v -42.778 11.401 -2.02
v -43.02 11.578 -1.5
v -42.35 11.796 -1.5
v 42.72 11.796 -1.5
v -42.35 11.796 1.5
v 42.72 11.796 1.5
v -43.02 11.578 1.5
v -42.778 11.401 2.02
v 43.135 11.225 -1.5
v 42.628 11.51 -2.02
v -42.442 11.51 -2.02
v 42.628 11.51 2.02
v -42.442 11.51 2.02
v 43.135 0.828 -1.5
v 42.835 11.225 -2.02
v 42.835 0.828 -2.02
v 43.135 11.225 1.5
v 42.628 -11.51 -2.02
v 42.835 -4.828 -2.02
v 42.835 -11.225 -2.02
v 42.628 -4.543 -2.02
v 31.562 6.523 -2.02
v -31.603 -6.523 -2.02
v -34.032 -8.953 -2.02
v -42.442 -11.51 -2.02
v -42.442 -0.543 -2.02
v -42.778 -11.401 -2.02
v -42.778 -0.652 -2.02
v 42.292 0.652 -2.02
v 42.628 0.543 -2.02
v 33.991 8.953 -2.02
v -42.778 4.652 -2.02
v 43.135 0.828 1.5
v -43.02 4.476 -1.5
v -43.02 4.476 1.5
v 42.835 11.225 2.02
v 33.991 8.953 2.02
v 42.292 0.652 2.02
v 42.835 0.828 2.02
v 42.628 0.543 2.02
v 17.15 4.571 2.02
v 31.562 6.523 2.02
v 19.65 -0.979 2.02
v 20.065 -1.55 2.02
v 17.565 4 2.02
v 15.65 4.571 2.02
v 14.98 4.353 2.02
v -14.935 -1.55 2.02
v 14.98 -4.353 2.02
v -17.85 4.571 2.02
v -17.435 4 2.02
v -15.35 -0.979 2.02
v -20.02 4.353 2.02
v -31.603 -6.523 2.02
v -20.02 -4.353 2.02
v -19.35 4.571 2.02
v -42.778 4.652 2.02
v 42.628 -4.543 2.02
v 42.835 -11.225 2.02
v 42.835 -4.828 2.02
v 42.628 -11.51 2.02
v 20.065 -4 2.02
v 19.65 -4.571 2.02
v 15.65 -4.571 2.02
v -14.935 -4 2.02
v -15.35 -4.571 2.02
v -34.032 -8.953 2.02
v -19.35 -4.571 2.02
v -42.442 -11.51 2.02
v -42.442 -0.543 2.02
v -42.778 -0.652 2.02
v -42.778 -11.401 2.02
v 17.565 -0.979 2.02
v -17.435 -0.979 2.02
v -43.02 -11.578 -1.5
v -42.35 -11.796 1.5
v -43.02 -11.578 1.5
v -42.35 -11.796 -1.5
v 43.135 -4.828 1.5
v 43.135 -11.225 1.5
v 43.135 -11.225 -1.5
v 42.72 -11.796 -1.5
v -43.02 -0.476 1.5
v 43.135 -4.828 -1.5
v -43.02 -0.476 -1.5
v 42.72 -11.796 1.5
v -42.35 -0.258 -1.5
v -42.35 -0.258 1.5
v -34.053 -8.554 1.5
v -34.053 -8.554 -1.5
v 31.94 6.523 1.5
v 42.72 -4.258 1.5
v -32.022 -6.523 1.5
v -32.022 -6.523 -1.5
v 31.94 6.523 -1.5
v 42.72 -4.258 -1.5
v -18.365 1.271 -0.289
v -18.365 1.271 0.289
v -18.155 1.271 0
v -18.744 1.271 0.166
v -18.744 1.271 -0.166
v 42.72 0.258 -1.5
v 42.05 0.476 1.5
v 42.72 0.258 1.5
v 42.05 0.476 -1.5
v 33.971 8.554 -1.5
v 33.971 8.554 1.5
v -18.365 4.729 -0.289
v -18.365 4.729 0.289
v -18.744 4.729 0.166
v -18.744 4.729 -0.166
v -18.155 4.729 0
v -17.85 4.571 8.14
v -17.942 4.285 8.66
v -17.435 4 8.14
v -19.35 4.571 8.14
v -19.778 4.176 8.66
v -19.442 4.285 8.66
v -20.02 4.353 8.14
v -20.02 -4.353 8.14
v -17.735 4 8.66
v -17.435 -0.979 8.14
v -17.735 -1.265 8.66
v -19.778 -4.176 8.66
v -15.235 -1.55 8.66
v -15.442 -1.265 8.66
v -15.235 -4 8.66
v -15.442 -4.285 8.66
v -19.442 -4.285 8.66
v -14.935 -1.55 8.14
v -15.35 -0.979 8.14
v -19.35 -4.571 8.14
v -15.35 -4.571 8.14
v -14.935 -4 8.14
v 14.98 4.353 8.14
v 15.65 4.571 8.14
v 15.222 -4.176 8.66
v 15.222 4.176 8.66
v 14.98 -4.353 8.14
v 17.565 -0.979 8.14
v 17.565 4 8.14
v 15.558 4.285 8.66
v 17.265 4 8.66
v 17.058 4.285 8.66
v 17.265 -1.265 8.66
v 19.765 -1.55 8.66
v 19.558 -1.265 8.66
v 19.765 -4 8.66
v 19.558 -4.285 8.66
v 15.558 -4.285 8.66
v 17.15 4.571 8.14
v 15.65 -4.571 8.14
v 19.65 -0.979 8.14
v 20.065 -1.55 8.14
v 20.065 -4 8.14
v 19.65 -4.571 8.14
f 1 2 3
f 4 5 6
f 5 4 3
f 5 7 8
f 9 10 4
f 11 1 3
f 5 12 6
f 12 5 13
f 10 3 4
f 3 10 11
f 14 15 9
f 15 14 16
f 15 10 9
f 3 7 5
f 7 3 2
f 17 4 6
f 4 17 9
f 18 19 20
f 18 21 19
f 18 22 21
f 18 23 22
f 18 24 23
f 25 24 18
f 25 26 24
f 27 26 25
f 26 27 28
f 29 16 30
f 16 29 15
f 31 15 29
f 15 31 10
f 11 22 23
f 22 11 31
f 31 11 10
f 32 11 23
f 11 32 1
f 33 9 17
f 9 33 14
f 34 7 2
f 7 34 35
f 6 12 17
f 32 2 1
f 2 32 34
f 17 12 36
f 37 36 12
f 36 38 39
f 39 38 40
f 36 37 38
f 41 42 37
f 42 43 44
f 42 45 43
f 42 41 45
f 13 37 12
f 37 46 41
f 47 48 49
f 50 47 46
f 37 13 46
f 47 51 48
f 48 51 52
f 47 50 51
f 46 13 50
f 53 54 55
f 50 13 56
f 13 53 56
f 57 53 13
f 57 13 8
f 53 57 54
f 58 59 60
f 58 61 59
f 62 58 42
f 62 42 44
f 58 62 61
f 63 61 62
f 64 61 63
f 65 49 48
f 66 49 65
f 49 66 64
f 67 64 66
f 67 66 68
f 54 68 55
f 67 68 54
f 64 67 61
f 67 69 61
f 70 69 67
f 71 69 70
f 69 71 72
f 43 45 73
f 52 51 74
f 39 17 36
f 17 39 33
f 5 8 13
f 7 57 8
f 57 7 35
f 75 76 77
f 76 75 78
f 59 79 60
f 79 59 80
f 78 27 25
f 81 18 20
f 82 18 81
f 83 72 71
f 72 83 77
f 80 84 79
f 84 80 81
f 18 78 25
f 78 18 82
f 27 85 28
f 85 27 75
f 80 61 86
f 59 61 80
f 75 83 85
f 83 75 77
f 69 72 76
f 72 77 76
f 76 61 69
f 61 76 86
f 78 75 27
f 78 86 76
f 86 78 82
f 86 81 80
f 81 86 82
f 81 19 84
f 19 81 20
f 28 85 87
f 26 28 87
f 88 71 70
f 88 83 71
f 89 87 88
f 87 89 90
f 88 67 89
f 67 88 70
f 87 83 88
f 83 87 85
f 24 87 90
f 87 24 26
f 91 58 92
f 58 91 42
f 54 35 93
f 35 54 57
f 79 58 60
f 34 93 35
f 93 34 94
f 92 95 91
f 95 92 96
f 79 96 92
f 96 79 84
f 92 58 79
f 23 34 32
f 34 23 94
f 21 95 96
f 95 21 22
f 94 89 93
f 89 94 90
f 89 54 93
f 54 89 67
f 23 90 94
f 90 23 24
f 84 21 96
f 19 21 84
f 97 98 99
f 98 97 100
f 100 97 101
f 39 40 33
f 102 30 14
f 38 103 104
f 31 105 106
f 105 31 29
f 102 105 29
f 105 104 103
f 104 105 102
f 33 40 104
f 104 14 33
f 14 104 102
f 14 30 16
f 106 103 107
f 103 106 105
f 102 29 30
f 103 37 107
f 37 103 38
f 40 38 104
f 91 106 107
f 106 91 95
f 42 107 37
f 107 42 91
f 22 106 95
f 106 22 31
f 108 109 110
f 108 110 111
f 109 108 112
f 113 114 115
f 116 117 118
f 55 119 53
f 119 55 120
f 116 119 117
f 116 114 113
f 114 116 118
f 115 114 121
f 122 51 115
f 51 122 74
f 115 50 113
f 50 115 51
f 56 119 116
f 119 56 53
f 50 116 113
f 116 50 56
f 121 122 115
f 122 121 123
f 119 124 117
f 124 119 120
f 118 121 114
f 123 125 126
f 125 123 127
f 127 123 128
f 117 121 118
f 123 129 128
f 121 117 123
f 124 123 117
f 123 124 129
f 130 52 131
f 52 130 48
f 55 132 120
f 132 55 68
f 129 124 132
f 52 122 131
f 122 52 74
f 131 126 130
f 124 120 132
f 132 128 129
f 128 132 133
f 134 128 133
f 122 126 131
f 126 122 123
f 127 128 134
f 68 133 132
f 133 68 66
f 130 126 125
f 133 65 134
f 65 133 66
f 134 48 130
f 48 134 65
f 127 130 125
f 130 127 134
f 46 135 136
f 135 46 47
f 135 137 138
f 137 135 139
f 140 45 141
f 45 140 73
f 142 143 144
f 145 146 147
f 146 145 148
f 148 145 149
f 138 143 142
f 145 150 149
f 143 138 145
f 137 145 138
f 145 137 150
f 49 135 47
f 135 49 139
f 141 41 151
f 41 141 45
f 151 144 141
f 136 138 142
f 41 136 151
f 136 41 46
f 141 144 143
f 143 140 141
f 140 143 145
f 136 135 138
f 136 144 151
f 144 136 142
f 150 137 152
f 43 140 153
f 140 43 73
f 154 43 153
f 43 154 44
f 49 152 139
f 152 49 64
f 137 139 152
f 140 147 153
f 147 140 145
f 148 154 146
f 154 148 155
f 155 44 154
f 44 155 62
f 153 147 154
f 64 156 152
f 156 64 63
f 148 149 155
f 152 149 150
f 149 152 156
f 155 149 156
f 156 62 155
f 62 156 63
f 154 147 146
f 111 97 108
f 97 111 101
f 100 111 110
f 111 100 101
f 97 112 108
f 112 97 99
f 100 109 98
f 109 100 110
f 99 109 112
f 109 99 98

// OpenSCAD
// Parameters
bbox_L = 85.07; //[42.535:170.14:0.01]
bbox_W = 22.45; //[11.225:44.9:0.01]
bbox_H = 10.44; //[5.22:20.88:0.01]
plate_L = 85.07; //[42.535:170.14:0.01]
plate_W = 22.45; //[11.225:44.9:0.01]
plate_T = 3.0; //[1.5:6.0:0.1]
end_chamfer_L = 4.0; //[2.0:8.0:0.1]
prong_W = 8.0; //[4.0:16.0:0.1]
prong_T = 4.0; //[2.0:8.0:0.1]
prong_H = 7.44; //[3.72:14.88:0.01]
prong1_center_from_left = 25.0; //[12.5:50.0:0.1]
prong2_center_from_left = 60.0; //[30.0:120.0:0.1]
prong_end_step_L = 2.5; //[1.25:5.0:0.1]
prong_end_step_drop = 1.5; //[0.75:3.0:0.1]
overlap = 0.8; //[0.5:2.0:0.1]
relief_r = 1.0; //[0.5:2.0:0.1]
cosmetic_r = 0.6; //[0.3:1.2:0.1]

// Base shapes
module base_bar_plate() {
  cube([plate_L, plate_W, plate_T], center=true);
}

module end_chamfer_left() {
  translate([-plate_L/2 + end_chamfer_L/2, 0, 0])
    rotate([0, 0, 45])
    cube([end_chamfer_L, plate_W, plate_T + 2*overlap], center=true);
}

module end_chamfer_right() {
  translate([plate_L/2 - end_chamfer_L/2, 0, 0])
    rotate([0, 0, 45])
    cube([end_chamfer_L, plate_W, plate_T + 2*overlap], center=true);
}

module prong_1() {
  translate([-plate_L/2 + prong1_center_from_left, 0, plate_T/2 + prong_H/2 - overlap])
    cube([prong_T, prong_W, prong_H], center=true);
}

module prong_2() {
  translate([-plate_L/2 + prong2_center_from_left, 0, plate_T/2 + prong_H/2 - overlap])
    cube([prong_T, prong_W, prong_H], center=true);
}

module prong_1_end_shoulder_step() {
  translate([-plate_L/2 + prong1_center_from_left + prong_T/2 - prong_end_step_L/2, prong_W/2 - prong_end_step_drop/2, plate_T/2 + prong_H/2 - overlap])
    cube([prong_end_step_L, prong_W + 2*overlap, prong_H + 2*overlap], center=true);
}

module prong_2_end_shoulder_step() {
  translate([-plate_L/2 + prong2_center_from_left + prong_T/2 - prong_end_step_L/2, prong_W/2 - prong_end_step_drop/2, plate_T/2 + prong_H/2 - overlap])
    cube([prong_end_step_L, prong_W + 2*overlap, prong_H + 2*overlap], center=true);
}

module minor_relief_cuts() {
  translate([-plate_L/2 + prong1_center_from_left - prong_T/2 + relief_r, prong_W/2 - relief_r, 0])
    rotate([90, 0, 0])
    cylinder(r=relief_r, h=plate_T + 2*overlap, center=true);
}

module edge_fillets() {
  sphere(r=cosmetic_r, center=true);
}

// Operations
module plate_chamfered() {
  difference() {
    base_bar_plate();
    end_chamfer_left();
    end_chamfer_right();
  }
}

module prongs_union_raw() {
  union() {
    prong_1();
    prong_2();
  }
}

module prongs_stepped_1() {
  difference() {
    prongs_union_raw();
    prong_1_end_shoulder_step();
    prong_2_end_shoulder_step();
  }
}

module plate_plus_prongs() {
  union() {
    plate_chamfered();
    prongs_stepped_1();
  }
}

module with_reliefs() {
  difference() {
    plate_plus_prongs();
    minor_relief_cuts();
  }
}

module cosmetic_rounding() {
  minkowski() {
    with_reliefs();
    edge_fillets();
  }
}

// Final output
cosmetic_rounding();
